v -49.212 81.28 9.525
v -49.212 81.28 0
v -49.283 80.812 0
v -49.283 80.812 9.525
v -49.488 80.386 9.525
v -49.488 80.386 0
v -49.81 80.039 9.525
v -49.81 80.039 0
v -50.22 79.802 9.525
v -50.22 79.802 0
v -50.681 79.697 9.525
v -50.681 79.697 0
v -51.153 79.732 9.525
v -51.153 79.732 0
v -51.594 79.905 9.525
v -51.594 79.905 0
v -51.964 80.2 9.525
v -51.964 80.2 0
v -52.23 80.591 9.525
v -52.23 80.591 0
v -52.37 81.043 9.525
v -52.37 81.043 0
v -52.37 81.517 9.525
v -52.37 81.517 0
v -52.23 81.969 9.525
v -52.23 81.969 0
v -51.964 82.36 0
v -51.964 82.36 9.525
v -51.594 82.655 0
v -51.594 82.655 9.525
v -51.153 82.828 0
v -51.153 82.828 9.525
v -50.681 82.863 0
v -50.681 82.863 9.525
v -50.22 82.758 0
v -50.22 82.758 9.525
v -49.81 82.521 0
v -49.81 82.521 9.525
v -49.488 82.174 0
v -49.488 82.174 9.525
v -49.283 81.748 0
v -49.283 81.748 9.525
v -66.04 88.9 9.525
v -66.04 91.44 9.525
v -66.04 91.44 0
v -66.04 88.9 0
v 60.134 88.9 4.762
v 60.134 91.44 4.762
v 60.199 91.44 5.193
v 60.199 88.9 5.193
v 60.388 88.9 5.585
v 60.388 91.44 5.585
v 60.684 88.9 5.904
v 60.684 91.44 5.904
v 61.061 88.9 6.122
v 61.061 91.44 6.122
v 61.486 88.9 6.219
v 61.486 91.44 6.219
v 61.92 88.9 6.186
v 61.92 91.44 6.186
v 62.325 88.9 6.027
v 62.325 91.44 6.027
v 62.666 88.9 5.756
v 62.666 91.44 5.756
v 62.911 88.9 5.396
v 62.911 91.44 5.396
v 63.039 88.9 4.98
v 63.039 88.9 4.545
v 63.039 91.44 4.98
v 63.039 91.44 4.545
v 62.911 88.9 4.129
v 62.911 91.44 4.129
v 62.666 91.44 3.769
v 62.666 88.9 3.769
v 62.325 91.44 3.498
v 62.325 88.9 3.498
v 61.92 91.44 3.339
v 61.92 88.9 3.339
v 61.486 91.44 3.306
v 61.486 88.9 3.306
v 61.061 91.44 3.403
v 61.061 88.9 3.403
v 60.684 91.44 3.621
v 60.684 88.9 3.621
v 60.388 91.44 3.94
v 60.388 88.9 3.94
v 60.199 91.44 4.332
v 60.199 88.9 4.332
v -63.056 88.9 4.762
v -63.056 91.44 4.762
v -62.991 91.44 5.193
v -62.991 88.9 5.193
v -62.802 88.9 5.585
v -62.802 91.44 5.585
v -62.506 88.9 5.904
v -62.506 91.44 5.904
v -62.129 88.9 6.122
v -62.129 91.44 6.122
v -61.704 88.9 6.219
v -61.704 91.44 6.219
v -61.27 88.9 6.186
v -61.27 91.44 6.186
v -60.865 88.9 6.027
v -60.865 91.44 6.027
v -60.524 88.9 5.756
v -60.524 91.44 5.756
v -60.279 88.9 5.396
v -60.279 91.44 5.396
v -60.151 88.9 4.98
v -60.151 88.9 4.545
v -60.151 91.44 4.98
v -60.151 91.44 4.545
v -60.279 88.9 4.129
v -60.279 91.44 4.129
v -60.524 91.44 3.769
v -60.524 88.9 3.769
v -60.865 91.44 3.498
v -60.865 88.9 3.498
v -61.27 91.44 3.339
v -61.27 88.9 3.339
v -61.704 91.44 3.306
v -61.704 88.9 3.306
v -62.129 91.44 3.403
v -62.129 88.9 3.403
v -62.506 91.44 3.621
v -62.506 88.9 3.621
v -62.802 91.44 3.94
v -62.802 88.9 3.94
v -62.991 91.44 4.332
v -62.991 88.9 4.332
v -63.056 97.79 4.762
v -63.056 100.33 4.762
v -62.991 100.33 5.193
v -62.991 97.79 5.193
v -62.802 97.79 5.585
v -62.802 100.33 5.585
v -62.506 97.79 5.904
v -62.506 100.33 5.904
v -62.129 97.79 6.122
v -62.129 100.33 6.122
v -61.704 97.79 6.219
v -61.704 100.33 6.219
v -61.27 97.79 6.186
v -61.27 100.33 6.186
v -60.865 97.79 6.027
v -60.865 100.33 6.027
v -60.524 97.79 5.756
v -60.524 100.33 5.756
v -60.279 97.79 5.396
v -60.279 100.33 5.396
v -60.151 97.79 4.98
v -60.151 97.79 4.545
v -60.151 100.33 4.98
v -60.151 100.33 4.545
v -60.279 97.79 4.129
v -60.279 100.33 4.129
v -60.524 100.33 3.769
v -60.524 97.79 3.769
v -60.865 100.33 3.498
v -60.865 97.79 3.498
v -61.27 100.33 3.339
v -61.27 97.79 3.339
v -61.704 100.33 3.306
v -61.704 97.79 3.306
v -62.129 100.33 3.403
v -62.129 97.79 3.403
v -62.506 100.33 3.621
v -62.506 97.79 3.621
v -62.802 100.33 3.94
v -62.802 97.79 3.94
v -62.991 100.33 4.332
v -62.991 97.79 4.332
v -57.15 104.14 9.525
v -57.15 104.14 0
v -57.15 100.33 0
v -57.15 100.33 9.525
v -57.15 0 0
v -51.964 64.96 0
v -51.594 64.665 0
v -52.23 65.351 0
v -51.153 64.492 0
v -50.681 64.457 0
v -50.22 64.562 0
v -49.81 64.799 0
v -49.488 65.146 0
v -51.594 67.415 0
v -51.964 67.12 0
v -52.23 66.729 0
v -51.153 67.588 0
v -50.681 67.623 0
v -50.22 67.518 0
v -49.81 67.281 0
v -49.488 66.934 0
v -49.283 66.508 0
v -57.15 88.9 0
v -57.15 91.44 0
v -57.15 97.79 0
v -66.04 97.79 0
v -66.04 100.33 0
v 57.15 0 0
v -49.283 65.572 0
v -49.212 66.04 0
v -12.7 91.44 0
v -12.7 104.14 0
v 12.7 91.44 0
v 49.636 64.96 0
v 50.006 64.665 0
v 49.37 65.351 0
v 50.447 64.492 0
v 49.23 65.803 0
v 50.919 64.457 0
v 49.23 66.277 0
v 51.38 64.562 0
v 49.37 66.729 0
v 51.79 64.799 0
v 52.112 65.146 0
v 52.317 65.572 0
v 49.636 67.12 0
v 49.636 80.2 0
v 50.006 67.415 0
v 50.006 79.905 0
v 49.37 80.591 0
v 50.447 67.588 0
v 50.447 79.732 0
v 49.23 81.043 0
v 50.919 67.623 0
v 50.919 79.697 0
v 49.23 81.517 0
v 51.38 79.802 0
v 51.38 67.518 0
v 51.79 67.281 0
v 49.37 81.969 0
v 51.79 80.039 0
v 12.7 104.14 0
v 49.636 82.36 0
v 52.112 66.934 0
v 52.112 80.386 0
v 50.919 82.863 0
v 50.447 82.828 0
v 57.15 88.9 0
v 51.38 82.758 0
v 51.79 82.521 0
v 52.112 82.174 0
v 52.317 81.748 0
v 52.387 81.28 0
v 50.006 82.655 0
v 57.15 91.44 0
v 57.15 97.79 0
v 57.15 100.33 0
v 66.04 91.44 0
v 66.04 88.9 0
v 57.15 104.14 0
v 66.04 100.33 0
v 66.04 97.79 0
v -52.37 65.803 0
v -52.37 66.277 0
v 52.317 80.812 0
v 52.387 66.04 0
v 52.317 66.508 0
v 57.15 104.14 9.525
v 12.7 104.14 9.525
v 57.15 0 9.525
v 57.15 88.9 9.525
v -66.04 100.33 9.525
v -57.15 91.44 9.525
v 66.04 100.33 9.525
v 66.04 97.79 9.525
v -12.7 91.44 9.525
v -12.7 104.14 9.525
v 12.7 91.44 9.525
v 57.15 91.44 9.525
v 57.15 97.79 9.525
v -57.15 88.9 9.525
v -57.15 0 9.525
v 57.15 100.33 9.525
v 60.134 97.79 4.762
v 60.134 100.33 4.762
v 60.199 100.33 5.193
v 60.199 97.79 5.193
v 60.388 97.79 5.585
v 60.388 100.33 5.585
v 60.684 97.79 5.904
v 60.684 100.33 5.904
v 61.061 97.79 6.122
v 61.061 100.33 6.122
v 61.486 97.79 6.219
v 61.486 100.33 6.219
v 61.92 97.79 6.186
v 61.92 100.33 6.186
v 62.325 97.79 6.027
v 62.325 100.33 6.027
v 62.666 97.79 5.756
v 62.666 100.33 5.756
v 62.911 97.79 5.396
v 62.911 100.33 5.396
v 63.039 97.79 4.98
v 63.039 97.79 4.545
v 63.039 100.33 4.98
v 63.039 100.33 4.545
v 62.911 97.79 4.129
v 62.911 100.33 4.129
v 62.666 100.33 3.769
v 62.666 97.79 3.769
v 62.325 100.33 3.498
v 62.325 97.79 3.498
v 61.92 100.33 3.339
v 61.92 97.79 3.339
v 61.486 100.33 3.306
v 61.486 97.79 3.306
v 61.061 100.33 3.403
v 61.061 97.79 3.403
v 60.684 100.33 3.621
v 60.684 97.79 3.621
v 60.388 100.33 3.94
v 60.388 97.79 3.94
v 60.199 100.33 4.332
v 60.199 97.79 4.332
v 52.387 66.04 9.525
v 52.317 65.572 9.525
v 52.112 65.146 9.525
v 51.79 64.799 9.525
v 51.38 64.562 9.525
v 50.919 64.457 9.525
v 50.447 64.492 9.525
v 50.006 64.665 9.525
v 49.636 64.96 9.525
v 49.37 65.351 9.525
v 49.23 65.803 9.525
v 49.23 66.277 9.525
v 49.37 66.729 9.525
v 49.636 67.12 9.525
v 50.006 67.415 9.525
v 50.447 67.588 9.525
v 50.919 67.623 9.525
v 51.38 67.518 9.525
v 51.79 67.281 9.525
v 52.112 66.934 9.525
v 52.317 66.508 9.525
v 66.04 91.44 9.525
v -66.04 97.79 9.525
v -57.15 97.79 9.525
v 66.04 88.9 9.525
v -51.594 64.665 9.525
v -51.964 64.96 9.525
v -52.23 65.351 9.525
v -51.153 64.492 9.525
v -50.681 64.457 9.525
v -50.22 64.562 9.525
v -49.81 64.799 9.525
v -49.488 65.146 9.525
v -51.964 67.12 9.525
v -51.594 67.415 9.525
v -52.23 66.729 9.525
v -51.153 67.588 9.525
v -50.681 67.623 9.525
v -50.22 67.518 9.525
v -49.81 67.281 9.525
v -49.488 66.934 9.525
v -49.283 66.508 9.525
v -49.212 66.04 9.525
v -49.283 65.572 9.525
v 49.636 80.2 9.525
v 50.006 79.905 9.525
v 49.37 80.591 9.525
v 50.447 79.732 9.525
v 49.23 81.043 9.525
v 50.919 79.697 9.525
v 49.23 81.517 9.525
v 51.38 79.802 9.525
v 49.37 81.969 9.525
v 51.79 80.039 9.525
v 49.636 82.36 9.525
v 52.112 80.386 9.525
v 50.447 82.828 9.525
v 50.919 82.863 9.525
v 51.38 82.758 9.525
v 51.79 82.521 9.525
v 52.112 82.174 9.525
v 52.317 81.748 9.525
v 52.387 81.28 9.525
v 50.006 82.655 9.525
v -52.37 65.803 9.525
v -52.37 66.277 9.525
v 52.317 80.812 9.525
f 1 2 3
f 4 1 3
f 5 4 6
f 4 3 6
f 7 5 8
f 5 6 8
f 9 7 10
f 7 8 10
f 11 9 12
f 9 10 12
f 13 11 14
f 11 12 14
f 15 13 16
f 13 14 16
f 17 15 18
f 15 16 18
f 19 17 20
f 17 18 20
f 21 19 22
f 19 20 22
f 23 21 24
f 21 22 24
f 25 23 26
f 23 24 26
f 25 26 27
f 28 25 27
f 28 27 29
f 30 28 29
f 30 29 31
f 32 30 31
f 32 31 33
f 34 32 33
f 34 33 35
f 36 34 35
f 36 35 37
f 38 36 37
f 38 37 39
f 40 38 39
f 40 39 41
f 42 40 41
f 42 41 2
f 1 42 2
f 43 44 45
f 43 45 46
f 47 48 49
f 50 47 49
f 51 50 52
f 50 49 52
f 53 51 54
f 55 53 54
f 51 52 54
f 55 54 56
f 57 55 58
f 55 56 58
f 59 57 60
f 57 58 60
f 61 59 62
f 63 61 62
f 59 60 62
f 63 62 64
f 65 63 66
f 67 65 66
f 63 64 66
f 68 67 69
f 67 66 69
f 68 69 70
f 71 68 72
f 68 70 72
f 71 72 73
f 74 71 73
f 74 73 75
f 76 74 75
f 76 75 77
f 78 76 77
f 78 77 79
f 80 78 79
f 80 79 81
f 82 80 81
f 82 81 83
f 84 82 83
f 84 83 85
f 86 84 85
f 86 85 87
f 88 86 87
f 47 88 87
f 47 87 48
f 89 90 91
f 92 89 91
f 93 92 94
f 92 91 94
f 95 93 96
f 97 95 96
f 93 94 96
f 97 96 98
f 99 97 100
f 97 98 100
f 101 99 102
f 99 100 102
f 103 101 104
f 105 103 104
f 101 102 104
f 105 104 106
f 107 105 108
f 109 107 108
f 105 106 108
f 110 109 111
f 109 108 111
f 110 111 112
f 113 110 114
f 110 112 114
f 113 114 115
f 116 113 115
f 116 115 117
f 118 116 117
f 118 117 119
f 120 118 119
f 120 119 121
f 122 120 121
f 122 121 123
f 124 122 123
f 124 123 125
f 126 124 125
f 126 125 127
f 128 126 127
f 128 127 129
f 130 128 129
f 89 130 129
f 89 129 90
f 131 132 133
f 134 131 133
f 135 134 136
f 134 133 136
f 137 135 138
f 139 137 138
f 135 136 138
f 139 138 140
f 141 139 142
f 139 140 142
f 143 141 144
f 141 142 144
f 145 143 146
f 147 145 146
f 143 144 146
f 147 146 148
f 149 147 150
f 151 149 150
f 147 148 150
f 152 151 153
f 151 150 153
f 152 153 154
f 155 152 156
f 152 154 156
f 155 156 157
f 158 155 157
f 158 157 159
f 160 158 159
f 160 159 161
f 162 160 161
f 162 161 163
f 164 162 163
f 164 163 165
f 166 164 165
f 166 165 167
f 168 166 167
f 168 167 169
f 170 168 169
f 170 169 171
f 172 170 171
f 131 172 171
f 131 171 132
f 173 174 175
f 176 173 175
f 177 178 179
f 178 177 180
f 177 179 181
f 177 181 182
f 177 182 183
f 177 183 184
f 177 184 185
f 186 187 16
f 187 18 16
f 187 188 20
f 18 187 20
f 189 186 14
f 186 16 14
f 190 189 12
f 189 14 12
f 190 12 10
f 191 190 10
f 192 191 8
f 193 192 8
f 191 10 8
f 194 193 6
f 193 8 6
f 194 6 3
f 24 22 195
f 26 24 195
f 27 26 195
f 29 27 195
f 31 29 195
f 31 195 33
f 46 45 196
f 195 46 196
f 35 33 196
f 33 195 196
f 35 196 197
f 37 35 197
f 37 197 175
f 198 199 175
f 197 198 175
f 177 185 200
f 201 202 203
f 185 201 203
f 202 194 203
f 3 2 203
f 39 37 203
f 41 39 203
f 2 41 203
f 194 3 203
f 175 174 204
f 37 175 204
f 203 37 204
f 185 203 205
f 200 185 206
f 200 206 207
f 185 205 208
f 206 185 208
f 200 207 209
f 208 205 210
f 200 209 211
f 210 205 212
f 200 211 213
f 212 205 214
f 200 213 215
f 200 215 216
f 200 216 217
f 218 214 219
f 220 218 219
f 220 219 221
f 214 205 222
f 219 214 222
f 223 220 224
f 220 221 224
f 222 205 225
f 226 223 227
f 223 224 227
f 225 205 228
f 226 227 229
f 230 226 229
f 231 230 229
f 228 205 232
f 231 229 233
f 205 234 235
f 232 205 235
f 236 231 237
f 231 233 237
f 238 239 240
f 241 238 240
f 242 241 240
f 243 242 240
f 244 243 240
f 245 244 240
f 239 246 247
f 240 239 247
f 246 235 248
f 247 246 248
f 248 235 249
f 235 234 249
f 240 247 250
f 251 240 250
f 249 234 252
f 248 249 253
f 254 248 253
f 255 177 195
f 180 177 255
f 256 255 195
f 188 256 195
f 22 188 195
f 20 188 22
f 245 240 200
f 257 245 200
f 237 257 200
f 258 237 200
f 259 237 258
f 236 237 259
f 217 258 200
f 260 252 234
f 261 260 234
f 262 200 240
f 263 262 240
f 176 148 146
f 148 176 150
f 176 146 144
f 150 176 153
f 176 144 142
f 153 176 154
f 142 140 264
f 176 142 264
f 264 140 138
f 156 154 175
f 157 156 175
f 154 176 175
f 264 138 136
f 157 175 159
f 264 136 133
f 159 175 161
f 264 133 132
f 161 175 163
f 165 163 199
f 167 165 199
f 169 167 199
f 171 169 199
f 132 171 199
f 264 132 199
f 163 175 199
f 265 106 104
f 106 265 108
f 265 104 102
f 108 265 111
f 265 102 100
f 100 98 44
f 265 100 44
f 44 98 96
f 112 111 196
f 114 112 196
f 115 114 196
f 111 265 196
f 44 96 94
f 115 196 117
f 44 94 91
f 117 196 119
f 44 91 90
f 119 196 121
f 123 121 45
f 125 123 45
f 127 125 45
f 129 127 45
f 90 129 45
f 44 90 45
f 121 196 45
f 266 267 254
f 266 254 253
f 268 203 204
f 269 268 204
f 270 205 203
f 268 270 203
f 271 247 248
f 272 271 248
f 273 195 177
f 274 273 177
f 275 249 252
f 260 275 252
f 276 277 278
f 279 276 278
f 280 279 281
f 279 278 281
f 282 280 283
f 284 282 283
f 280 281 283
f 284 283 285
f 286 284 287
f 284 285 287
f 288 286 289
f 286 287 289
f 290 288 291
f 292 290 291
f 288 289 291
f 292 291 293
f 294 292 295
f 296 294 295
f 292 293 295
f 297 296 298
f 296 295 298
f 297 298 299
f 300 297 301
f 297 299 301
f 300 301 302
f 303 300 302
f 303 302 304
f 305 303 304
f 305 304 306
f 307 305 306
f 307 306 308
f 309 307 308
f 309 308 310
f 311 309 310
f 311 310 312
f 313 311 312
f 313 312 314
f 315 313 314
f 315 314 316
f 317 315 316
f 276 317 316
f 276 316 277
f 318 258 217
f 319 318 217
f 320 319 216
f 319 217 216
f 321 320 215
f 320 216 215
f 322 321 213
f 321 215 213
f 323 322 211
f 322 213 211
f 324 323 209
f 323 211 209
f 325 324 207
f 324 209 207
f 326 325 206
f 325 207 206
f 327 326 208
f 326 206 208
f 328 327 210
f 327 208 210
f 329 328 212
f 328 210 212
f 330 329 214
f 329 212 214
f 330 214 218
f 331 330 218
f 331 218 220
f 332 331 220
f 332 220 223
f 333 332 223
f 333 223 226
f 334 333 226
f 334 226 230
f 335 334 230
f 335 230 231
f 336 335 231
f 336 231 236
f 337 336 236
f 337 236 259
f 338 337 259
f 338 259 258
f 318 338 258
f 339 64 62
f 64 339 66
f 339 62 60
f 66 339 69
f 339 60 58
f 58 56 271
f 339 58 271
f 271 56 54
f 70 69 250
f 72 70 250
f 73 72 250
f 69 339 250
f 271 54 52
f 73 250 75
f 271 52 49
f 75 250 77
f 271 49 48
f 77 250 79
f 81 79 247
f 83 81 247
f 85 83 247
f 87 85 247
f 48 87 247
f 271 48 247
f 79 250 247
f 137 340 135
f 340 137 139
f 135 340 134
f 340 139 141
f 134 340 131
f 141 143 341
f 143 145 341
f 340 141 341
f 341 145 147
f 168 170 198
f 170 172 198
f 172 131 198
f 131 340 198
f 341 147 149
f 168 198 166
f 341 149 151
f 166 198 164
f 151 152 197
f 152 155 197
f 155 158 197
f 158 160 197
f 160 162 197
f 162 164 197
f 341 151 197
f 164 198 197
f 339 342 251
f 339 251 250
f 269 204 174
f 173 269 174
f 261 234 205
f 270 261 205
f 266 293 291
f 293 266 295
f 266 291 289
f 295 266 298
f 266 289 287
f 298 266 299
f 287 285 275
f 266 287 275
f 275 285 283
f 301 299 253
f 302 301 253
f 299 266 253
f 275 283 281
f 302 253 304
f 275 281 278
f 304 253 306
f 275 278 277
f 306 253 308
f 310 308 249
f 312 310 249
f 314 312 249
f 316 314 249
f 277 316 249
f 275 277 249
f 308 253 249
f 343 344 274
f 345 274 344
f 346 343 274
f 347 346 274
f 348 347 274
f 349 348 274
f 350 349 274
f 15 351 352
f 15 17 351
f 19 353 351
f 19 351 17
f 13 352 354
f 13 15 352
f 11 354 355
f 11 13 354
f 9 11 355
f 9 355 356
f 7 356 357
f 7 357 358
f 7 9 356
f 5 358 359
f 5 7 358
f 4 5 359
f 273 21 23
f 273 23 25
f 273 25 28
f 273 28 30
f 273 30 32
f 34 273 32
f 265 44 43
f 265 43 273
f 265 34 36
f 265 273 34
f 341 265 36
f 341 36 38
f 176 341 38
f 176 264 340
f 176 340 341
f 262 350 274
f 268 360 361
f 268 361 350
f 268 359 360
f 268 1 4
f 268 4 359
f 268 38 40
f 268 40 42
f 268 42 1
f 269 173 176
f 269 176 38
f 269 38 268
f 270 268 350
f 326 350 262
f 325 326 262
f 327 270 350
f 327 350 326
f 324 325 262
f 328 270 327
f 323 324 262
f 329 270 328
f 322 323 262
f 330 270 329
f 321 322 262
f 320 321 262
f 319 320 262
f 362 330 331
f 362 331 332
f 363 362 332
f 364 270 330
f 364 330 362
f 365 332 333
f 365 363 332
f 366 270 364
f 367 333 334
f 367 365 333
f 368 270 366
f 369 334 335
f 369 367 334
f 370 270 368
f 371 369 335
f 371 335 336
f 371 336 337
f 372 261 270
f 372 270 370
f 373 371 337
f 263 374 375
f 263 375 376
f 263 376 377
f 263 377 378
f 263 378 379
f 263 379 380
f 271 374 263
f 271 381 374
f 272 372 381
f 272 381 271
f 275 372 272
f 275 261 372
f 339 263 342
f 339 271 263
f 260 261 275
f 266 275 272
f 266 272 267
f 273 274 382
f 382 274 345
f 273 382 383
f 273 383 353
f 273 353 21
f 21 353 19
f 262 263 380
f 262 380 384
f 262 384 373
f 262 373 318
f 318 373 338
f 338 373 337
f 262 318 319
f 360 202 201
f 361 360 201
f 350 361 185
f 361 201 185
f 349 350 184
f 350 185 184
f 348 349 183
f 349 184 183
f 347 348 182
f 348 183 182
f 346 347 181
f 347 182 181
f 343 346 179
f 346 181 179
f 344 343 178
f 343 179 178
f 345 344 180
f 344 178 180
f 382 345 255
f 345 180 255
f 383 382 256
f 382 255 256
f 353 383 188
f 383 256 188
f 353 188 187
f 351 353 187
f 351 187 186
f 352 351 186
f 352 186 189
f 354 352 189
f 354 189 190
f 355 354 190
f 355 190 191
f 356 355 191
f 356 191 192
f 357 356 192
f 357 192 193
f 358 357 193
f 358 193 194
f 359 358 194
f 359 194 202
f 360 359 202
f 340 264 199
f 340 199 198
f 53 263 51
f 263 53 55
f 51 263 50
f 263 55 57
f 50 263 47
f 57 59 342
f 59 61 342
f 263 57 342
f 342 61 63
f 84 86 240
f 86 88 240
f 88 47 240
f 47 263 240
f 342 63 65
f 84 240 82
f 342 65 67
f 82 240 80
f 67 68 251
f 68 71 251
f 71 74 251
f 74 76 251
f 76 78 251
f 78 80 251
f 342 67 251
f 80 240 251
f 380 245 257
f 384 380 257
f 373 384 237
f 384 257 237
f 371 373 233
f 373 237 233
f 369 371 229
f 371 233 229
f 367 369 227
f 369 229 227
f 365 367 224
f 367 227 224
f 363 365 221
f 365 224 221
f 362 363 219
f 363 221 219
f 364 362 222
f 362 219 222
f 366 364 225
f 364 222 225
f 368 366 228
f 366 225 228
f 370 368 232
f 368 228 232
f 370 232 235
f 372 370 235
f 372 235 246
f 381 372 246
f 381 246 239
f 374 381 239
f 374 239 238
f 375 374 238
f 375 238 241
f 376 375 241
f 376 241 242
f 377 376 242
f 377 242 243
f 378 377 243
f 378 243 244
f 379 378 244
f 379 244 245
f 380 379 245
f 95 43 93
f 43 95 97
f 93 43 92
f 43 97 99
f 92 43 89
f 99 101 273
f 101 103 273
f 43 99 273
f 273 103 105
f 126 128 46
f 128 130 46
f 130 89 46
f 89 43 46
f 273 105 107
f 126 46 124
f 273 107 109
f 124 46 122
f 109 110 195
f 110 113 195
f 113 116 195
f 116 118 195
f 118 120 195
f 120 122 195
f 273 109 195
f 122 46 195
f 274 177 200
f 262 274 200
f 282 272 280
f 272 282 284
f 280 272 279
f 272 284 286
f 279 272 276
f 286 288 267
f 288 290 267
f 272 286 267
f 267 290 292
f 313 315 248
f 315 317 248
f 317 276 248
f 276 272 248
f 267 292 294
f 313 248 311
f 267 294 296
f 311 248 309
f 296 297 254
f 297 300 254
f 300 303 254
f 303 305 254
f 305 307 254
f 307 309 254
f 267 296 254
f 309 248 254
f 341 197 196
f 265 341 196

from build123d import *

# Parameters (mm, degrees)
F1_DEPTH = 9.525
F2_R     = 1.4605
F3_DEPTH = 100.331
F4_R     = 1.5875
F5_DEPTH = 9.526


with BuildPart() as f1:
    # F0 (on Top) → F1 (new body)
    with BuildSketch(Plane.XY):
        Polygon((57.15, 100.33), (57.15, 104.14), (12.7, 104.14), (12.7, 91.44), (0, 91.44), (-12.7, 91.44), (-12.7, 104.14), (-57.15, 104.14), (-57.15, 100.33), (-66.04, 100.33), (-66.04, 97.79), (-57.15, 97.79), (-57.15, 91.44), (-66.04, 91.44), (-66.04, 88.9), (-57.15, 88.9), (-57.15, 0), (0, 0), (57.15, 0), (57.15, 88.9), (66.04, 88.9), (66.04, 91.44), (57.15, 91.44), (57.15, 97.79), (66.04, 97.79), (66.04, 100.33), align=None)
    extrude(amount=F1_DEPTH)

    # F2 (on face) → F3 (cut, through all)
    with BuildSketch(Plane(origin=(0, 100.33, 0), x_dir=(-1, 0, 0), z_dir=(0, 1, 0))):
        with Locations((-61.595, 4.7625)):
            Circle(F2_R)
        with Locations((61.595, 4.7625)):
            Circle(F2_R)
    extrude(amount=-F3_DEPTH, mode=Mode.SUBTRACT)

    # F4 (on face) → F5 (cut, through all)
    with BuildSketch(Plane(origin=(0, 0, 0), x_dir=(1, 0, 0), z_dir=(0, 0, -1))):
        with Locations((50.8, -81.28)):
            Circle(F4_R)
        with Locations((50.8, -66.04)):
            Circle(F4_R)
        with Locations((-50.8, -81.28)):
            Circle(F4_R)
        with Locations((-50.8, -66.04)):
            Circle(F4_R)
    extrude(amount=-F5_DEPTH, mode=Mode.SUBTRACT)


solid = f1.part
